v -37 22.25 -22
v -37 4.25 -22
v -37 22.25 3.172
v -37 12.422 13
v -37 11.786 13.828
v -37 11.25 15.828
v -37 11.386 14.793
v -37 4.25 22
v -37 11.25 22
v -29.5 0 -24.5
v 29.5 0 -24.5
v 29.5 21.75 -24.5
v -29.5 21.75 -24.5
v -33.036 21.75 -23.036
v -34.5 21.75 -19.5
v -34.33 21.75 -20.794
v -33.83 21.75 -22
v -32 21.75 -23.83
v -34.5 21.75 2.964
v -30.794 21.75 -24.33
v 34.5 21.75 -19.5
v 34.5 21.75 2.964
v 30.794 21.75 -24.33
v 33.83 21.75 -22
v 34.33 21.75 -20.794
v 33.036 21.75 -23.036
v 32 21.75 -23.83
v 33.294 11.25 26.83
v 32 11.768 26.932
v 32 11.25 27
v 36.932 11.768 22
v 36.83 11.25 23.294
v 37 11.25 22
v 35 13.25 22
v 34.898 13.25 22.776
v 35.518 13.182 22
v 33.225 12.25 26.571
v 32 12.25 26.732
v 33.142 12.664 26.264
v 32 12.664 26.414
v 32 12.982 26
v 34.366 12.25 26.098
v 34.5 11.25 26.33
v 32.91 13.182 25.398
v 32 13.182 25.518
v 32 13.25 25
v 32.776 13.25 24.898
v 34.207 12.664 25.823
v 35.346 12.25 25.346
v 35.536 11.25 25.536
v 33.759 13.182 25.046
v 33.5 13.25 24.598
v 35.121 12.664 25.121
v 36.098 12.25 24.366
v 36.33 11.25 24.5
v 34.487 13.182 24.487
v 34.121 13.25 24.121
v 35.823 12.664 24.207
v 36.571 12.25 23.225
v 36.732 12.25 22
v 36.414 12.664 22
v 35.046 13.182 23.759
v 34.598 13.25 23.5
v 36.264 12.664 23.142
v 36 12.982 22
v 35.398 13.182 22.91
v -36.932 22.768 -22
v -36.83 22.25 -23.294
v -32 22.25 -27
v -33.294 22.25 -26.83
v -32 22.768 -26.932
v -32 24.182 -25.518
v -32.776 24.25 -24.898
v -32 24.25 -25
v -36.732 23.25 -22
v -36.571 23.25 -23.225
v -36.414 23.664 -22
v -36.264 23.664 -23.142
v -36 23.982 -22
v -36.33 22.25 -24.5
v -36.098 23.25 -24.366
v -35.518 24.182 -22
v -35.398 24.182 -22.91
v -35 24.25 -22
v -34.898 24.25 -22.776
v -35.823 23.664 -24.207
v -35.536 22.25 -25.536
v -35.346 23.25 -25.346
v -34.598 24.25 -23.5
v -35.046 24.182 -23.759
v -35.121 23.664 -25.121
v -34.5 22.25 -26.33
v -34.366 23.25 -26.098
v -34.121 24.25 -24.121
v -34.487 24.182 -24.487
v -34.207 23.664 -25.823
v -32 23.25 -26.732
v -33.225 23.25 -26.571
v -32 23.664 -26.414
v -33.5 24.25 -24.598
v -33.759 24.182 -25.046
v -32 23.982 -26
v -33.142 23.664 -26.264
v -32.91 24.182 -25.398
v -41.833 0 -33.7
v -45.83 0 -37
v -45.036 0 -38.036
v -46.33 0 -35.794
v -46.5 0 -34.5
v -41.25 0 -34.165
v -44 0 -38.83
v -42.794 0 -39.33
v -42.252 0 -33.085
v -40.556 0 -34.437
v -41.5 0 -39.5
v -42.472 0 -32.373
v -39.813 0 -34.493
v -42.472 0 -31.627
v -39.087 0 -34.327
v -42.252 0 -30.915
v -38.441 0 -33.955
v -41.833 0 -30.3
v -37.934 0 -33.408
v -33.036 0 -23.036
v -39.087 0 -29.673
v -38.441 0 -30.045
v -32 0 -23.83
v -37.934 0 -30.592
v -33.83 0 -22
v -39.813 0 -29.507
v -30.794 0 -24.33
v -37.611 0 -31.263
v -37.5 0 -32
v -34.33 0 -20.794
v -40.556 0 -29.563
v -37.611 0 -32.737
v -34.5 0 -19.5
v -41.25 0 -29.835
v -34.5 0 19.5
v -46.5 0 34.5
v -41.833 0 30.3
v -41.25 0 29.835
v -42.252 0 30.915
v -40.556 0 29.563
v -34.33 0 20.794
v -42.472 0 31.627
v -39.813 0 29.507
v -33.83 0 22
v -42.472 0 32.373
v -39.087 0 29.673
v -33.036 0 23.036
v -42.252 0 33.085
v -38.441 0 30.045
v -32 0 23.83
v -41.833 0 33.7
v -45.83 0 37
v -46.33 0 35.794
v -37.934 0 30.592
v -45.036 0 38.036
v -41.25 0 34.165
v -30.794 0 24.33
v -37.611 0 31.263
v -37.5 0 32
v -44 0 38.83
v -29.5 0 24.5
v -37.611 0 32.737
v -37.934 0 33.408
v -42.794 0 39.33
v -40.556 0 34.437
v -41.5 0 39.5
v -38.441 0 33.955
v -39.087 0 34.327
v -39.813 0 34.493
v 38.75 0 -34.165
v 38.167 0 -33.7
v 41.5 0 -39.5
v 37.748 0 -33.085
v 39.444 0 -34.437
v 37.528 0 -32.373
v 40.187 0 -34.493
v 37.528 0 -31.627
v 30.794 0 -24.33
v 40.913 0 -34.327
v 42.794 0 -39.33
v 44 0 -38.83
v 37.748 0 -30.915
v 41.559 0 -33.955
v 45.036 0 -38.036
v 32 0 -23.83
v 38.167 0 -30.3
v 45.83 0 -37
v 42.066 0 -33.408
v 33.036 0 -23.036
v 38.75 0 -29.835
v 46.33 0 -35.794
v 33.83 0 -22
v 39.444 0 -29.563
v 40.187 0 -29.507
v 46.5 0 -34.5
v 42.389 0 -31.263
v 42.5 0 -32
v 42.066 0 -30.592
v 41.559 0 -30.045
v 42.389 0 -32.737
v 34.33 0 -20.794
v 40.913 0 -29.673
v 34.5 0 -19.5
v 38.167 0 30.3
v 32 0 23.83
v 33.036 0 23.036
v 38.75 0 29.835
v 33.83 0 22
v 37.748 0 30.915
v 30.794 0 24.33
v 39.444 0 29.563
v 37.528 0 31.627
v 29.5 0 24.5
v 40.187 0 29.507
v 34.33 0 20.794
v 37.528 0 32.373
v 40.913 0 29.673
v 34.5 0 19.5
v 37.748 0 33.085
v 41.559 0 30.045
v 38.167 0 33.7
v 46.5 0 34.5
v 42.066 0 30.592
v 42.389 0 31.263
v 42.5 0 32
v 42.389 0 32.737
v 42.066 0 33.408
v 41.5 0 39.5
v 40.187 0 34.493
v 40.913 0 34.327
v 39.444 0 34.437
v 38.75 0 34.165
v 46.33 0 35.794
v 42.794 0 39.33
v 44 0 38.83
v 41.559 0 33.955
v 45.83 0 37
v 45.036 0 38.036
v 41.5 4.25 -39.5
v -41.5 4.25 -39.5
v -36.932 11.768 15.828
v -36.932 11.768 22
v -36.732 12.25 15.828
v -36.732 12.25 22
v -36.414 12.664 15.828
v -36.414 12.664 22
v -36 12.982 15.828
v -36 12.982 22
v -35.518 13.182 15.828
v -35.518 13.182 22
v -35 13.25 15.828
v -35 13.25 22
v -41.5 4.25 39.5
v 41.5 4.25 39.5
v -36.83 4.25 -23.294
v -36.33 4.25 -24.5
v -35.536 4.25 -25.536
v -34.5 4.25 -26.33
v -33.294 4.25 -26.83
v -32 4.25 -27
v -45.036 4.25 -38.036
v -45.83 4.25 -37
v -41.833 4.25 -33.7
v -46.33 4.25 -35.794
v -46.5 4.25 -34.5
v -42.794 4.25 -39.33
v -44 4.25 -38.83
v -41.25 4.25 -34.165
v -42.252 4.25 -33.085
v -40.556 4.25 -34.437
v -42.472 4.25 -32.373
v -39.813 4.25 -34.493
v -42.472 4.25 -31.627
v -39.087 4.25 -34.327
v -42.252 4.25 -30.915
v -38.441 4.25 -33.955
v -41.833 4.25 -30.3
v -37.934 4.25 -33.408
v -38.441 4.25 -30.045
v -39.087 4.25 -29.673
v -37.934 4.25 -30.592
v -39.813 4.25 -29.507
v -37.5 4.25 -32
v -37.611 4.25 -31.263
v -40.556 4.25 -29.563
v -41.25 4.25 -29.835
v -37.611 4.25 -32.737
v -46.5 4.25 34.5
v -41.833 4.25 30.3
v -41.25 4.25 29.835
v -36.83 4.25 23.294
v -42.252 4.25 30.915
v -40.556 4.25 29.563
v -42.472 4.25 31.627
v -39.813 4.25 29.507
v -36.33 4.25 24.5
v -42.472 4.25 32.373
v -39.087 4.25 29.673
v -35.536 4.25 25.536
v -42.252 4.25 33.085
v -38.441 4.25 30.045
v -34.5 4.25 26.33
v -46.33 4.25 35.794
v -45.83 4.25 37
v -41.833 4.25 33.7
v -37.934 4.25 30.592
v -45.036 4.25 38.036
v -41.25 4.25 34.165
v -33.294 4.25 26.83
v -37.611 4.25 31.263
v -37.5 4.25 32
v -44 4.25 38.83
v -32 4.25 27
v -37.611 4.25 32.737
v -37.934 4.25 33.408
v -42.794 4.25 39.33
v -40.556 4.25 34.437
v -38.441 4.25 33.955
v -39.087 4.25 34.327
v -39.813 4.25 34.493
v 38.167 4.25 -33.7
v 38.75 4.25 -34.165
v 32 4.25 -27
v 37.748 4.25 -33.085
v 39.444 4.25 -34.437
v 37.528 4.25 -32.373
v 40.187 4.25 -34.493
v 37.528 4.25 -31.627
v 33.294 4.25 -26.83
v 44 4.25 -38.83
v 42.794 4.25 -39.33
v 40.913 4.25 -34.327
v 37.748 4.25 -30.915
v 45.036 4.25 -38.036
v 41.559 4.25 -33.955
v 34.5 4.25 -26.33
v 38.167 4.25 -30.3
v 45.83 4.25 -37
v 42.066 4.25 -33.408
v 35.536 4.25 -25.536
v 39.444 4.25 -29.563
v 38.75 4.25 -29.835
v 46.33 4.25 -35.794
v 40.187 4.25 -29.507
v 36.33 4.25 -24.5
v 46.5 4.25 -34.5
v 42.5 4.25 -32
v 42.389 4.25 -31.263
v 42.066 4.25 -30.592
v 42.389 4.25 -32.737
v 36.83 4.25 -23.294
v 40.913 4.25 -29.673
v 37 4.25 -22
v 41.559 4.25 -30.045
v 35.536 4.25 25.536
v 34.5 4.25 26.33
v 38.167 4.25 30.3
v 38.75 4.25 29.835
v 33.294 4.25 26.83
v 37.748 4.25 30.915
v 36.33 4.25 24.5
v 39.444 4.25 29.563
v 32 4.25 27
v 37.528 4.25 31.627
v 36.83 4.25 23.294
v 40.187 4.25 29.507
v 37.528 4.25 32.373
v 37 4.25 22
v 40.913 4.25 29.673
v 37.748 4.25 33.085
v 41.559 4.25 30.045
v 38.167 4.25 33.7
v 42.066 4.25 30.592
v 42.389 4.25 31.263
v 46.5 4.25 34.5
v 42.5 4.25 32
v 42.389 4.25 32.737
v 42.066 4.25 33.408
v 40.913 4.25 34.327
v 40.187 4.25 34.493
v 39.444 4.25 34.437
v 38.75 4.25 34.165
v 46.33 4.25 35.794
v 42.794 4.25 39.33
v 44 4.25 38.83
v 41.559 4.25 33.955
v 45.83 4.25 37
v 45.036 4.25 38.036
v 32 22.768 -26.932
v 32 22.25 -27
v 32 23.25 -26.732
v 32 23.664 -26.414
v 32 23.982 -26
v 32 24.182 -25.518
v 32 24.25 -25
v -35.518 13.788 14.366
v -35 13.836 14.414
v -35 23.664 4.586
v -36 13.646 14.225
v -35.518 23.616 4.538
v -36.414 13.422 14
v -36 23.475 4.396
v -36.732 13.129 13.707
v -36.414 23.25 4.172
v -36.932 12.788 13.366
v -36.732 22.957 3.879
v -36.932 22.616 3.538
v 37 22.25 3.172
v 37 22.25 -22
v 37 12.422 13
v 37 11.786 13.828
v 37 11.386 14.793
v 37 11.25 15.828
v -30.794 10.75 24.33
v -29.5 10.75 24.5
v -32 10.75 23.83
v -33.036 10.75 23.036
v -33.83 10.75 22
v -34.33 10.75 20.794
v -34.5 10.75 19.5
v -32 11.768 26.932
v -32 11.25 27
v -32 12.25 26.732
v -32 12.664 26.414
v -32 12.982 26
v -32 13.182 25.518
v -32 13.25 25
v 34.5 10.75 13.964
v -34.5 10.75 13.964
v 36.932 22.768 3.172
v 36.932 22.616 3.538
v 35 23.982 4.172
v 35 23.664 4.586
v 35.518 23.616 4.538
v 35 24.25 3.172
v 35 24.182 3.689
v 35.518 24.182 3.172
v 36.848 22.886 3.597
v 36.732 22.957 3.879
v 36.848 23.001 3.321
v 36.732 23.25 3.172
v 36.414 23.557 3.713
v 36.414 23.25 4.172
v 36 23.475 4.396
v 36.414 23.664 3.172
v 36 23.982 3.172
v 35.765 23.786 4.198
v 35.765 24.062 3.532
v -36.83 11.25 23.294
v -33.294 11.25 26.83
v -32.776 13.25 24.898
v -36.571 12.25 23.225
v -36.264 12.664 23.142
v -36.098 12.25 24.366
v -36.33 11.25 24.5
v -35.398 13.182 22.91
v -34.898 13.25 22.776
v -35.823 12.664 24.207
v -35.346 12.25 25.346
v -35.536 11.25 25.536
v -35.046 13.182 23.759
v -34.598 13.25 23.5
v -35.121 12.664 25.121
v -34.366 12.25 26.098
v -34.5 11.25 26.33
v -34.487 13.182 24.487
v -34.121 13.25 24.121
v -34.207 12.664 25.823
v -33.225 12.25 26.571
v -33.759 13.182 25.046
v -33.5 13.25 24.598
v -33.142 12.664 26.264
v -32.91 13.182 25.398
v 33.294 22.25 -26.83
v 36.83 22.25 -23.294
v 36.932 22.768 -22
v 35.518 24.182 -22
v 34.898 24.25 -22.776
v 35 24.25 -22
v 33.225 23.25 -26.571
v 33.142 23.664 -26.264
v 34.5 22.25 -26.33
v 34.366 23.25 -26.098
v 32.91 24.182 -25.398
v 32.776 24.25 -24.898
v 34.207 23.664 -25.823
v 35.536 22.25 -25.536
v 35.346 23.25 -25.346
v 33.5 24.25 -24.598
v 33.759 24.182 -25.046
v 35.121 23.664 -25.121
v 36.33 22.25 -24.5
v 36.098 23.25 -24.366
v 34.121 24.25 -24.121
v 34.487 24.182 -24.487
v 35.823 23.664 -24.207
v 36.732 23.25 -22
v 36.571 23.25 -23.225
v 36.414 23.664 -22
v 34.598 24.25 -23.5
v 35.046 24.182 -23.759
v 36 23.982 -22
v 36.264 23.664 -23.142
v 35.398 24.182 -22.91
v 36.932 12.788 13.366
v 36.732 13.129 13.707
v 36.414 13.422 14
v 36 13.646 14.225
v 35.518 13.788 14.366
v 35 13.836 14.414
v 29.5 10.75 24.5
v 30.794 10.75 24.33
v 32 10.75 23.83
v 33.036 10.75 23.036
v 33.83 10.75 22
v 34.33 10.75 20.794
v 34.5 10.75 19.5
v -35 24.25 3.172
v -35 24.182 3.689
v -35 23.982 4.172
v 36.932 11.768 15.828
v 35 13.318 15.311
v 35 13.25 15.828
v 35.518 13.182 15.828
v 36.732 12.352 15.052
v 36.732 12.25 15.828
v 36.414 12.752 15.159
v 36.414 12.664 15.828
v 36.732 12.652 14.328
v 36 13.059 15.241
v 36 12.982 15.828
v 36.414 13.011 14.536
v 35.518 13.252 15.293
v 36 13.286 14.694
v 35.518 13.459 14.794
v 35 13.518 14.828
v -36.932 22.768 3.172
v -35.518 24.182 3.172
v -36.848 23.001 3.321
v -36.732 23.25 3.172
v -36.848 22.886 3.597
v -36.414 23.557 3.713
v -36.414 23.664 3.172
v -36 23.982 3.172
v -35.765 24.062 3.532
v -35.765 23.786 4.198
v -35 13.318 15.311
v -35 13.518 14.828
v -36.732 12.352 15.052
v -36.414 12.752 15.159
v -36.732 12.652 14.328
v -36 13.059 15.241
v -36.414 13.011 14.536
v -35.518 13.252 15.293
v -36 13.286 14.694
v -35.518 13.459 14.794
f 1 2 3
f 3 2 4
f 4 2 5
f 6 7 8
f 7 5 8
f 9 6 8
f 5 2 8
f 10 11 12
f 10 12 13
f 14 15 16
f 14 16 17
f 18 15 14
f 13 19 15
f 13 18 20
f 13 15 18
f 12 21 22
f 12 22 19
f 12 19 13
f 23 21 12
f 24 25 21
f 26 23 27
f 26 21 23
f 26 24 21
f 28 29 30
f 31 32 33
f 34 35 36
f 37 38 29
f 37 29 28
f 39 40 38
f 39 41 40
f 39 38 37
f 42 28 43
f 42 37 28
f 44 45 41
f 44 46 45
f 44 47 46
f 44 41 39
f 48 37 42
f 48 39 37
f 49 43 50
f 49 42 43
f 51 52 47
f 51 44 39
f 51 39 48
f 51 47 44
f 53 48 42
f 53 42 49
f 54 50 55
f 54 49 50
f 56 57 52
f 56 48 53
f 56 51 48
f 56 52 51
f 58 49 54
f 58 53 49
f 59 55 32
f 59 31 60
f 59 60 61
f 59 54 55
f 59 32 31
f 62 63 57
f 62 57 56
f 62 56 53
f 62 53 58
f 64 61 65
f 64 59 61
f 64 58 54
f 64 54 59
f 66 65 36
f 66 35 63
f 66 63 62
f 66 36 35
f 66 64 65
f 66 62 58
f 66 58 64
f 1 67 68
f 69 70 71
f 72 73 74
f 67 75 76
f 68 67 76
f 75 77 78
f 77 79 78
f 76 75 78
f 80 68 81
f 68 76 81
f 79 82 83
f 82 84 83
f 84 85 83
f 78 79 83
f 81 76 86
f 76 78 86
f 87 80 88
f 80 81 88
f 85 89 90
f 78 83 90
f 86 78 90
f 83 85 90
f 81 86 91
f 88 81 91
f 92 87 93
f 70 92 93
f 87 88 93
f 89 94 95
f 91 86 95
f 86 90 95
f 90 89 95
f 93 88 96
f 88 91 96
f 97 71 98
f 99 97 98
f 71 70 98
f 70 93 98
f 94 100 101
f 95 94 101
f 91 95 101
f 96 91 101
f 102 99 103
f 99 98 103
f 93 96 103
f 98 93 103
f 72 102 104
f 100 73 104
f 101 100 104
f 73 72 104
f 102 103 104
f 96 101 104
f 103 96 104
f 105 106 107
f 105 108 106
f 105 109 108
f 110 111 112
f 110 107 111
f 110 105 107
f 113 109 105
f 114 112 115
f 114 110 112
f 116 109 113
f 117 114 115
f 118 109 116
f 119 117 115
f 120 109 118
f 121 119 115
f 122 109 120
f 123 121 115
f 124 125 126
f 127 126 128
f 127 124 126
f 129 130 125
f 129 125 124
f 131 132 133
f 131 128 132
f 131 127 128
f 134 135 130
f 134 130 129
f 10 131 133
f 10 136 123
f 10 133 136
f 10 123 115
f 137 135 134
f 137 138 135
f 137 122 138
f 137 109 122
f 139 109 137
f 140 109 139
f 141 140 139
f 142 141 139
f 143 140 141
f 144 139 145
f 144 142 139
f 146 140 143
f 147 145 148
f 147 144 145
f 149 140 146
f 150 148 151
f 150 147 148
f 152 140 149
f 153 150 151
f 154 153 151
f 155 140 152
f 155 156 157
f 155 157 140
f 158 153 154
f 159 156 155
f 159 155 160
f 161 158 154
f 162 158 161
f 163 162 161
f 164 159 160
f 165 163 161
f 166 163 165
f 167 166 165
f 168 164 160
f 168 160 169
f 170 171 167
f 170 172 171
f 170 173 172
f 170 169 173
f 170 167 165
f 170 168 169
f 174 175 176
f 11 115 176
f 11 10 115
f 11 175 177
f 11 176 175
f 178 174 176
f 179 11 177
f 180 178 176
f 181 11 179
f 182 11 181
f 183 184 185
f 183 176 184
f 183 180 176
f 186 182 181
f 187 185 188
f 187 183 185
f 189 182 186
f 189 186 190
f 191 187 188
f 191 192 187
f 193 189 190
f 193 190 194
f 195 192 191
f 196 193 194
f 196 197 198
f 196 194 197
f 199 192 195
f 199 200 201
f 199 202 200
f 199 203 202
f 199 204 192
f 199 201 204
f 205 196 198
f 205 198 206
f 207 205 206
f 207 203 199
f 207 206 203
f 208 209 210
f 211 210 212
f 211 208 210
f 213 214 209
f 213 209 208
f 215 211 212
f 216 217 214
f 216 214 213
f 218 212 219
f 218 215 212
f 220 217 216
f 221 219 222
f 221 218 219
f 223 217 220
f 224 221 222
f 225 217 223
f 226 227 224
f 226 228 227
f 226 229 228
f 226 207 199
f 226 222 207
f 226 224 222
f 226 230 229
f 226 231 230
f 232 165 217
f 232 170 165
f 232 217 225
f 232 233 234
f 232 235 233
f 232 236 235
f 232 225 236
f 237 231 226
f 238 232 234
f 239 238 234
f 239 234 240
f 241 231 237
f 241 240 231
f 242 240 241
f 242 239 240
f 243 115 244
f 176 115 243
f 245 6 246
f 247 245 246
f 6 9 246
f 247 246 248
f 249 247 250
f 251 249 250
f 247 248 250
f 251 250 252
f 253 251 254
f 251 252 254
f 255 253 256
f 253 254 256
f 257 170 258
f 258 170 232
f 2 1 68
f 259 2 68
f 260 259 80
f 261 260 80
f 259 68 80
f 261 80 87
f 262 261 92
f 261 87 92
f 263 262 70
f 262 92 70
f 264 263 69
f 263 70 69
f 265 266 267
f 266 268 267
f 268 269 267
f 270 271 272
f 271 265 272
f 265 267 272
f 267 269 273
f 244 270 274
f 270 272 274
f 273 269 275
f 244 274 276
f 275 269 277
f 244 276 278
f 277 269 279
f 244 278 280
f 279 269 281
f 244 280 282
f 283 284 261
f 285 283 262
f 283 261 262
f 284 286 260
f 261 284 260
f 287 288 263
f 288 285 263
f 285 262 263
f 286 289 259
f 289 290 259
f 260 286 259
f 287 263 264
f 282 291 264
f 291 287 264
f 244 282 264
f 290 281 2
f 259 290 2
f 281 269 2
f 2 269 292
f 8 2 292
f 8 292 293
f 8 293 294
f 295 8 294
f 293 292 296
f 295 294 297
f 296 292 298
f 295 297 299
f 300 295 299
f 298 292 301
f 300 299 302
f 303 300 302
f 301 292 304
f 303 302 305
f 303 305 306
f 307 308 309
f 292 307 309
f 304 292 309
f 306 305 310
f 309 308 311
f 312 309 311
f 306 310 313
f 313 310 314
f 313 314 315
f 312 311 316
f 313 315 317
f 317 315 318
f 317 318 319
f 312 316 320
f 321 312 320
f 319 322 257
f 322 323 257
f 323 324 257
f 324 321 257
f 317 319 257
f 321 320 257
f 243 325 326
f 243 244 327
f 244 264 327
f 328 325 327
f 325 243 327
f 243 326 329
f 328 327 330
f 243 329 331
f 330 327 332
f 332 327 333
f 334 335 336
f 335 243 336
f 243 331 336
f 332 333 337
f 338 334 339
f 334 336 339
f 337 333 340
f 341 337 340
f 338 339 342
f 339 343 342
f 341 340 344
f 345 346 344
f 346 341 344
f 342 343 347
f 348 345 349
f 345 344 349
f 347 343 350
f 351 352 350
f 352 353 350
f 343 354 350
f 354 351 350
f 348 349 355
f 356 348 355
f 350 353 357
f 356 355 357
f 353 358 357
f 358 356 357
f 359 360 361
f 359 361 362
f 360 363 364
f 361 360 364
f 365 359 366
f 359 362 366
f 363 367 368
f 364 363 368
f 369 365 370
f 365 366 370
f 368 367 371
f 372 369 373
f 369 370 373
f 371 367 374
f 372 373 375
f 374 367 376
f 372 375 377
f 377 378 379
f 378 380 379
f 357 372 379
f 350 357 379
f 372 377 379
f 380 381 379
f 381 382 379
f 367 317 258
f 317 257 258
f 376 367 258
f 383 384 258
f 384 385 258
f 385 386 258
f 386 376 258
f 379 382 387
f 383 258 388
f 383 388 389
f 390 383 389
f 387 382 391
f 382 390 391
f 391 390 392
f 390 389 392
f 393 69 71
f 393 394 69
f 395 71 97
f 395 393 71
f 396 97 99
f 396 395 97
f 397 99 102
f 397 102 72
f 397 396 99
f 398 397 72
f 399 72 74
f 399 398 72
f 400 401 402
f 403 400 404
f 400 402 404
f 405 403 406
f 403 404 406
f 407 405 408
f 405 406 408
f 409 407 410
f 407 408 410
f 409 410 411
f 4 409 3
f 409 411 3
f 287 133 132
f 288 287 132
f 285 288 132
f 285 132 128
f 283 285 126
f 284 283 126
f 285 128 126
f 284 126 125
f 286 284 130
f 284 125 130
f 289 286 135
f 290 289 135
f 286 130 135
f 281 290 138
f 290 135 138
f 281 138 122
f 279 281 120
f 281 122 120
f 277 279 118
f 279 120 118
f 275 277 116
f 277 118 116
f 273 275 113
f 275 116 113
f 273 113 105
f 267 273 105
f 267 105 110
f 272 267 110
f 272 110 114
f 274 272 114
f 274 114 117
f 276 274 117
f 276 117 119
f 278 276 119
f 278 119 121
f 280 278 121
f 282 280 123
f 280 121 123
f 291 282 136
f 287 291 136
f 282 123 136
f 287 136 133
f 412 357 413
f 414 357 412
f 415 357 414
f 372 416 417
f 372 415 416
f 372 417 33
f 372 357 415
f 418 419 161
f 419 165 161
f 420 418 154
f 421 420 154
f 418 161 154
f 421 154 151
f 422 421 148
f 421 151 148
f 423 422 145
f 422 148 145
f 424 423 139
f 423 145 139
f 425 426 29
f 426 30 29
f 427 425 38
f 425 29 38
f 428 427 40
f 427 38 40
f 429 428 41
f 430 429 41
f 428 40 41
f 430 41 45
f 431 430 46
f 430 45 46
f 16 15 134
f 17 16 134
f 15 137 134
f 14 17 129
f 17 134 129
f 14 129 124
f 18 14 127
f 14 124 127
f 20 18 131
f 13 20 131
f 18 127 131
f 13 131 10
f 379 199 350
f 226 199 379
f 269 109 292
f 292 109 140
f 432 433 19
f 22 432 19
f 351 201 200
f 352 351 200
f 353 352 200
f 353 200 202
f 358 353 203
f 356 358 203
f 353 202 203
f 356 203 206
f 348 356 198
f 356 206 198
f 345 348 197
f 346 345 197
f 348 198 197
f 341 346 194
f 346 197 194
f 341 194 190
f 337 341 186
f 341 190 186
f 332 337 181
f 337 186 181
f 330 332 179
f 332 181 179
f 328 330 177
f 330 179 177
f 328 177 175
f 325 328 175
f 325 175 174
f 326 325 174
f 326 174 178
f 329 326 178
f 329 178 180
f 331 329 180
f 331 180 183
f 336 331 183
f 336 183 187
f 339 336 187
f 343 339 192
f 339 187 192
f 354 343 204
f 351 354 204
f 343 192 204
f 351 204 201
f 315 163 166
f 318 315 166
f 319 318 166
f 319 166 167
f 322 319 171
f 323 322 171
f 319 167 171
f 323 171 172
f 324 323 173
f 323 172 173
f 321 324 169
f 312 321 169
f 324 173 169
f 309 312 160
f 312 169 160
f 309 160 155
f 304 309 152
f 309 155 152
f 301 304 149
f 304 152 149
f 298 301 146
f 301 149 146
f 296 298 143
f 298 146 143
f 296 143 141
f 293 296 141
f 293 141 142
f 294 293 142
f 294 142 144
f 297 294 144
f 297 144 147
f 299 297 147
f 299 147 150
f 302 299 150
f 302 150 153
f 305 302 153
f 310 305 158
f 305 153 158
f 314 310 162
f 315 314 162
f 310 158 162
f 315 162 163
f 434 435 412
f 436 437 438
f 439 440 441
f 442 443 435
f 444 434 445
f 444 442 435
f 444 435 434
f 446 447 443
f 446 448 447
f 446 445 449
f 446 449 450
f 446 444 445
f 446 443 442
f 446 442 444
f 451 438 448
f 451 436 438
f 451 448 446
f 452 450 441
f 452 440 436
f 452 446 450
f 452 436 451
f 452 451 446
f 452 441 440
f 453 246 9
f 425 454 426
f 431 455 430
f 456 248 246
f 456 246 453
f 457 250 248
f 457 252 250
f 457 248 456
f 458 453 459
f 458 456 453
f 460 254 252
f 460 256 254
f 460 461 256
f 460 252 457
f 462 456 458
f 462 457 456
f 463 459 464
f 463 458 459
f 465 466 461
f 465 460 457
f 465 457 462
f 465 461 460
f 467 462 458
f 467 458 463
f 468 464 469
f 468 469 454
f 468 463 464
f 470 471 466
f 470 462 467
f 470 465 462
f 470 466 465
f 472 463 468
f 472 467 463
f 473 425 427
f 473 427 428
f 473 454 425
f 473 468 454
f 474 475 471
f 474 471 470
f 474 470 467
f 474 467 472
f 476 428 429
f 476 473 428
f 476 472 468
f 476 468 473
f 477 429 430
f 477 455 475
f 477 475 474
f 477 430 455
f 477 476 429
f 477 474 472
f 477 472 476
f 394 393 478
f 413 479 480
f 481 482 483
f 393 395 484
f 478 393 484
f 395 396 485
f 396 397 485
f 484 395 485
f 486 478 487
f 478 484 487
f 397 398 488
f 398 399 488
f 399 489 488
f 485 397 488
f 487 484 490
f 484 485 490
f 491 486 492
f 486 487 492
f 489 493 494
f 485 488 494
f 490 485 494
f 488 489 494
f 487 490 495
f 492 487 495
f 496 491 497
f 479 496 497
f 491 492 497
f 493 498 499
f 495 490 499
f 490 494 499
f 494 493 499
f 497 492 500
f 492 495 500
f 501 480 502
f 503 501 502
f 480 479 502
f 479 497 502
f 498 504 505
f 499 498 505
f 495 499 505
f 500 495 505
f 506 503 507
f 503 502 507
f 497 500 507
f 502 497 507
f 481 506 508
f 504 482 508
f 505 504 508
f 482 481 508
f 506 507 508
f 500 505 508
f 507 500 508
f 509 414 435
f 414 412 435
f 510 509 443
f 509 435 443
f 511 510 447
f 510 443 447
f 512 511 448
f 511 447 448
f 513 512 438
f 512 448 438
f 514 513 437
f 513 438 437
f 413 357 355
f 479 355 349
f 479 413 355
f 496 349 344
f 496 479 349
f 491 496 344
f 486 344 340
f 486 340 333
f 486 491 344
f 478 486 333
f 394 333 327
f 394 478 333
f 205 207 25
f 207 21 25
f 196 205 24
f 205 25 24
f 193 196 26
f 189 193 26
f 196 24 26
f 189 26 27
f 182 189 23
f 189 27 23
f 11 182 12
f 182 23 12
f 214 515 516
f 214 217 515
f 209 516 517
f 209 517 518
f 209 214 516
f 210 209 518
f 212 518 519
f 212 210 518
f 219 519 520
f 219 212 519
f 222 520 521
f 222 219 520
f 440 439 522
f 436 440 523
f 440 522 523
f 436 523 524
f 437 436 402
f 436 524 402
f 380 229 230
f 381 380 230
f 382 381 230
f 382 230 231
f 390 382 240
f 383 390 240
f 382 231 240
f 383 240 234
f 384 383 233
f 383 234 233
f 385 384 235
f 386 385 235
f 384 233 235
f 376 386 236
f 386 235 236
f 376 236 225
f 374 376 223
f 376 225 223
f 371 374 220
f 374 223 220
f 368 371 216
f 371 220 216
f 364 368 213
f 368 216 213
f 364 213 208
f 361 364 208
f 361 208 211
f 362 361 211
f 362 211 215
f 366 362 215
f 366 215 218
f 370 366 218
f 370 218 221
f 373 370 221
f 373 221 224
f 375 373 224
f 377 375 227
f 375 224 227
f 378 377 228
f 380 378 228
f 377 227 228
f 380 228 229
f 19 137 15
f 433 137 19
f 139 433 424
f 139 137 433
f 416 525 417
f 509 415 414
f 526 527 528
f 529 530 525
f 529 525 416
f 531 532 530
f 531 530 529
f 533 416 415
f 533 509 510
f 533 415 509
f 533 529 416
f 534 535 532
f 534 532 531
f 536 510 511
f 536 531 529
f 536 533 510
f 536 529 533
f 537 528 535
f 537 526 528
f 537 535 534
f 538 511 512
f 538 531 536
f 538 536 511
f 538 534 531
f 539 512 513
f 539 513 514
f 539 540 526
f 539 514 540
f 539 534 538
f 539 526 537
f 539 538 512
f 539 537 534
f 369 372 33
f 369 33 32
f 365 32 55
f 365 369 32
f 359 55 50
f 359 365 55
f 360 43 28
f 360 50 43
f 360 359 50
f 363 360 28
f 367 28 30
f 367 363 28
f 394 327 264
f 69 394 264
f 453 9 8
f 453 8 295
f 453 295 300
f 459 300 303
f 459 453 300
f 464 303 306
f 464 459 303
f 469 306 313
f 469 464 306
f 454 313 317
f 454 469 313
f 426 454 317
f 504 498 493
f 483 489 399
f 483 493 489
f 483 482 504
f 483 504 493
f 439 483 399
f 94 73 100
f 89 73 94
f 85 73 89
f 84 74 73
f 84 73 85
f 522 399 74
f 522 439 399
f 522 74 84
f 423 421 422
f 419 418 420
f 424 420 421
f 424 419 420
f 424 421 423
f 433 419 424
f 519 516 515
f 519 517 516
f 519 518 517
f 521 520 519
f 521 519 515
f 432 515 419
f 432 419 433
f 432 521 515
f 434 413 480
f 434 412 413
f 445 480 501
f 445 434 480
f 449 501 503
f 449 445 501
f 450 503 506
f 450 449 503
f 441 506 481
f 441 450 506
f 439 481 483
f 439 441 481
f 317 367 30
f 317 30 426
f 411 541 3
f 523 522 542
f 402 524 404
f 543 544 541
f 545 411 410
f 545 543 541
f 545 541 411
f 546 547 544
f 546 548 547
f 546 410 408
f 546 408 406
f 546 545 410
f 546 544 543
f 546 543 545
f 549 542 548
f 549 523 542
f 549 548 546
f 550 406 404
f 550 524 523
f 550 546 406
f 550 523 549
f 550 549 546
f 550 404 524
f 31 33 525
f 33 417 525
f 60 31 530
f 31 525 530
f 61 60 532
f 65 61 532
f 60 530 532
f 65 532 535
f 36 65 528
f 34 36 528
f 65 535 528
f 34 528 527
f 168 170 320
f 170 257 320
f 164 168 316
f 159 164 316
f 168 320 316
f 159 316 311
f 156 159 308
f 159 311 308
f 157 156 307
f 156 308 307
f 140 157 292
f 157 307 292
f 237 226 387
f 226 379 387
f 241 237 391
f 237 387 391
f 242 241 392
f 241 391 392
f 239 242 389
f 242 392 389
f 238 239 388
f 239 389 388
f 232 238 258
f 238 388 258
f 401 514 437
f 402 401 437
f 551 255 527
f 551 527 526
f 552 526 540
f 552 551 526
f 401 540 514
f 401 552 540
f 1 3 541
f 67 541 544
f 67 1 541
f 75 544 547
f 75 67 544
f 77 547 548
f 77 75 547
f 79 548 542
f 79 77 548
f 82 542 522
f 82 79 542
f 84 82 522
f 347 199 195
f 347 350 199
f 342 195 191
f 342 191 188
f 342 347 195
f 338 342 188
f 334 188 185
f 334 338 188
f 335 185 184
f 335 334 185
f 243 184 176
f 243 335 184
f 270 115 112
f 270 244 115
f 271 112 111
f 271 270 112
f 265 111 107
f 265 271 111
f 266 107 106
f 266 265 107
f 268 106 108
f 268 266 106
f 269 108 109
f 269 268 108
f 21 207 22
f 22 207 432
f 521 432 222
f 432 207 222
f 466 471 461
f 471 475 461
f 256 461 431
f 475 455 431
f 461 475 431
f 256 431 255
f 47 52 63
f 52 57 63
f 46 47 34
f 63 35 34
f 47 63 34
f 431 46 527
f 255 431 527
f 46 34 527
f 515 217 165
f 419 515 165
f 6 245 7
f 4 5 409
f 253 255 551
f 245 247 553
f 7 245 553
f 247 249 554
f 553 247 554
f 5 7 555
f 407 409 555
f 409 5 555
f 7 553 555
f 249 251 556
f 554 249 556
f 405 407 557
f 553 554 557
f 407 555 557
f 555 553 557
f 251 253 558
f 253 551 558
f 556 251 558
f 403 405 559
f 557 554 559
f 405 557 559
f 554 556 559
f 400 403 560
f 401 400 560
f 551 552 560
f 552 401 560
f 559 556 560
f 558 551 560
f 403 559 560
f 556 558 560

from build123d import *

# Parameters (mm, degrees)
F0_W     = 93
F0_H     = 79
F0_R     = 2.5
F0_W_2   = 69
F0_H_2   = 49
F1_DEPTH = 4.25
F2_W     = 74
F2_H     = 54
F2_W_2   = 69
F2_H_2   = 49
F3_DEPTH = 20
F6_DEPTH = 83.501
F8_DEPTH = 71.5
F9_R     = 5
F10_R    = 2


with BuildPart() as f1:
    # F0 (on Front) → F1 (new body)
    with BuildSketch(Plane.XZ):
        Rectangle(F0_W, F0_H)
        with Locations((-40, -32)):
            Circle(F0_R, mode=Mode.SUBTRACT)
        with Locations((40, -32)):
            Circle(F0_R, mode=Mode.SUBTRACT)
        with Locations((-40, 32)):
            Circle(F0_R, mode=Mode.SUBTRACT)
        Rectangle(F0_W_2, F0_H_2, mode=Mode.SUBTRACT)
        with Locations((40, 32)):
            Circle(F0_R, mode=Mode.SUBTRACT)
    extrude(amount=-F1_DEPTH)

    # F2 (on face) → F3 (join)
    with BuildSketch(Plane(origin=(0, 4.25, 0), x_dir=(-1, 0, 0), z_dir=(0, 1, 0))):
        Rectangle(F2_W, F2_H)
        Rectangle(F2_W_2, F2_H_2, mode=Mode.SUBTRACT)
    extrude(amount=F3_DEPTH)

    # F5 (on face) → F6 (cut, through all)
    with BuildSketch(Plane.YZ.offset(37)):
        Polygon((24.25, 29.4060515452), (13.25, 29.4060515452), (13.25, 15), (24.25, 4), align=None)
    extrude(amount=-F6_DEPTH, mode=Mode.SUBTRACT)

    # F7 (on face) → F8 (join, through all)
    with BuildSketch(Plane.YZ.offset(37)):
        Polygon((13.25, 27), (10.75, 27), (10.75, 13.9644660941), (21.75, 2.9644660941), (21.75, -27), (24.25, -27), (24.25, 4), (13.25, 15), align=None)
    extrude(amount=-F8_DEPTH)

    # F9
    f9_edges = [f1.edges().sort_by_distance(p)[0] for p in [
        (37, 14.25, -27),
        (37, 8.75, 27),
        (-37, 8.75, 27),
        (-37, 14.25, -27),
        (-46.5, 2.125, 39.5),
        (-46.5, 2.125, -39.5),
        (46.5, 2.125, 39.5),
        (46.5, 2.125, -39.5),
        (-34.5, 5.375, 24.5),
        (34.5, 5.375, 24.5),
        (34.5, 10.875, -24.5),
        (-34.5, 10.875, -24.5),
    ]]
    fillet(f9_edges, radius=F9_R)

    # F10
    f10_edges = [f1.edges().sort_by_distance(p)[0] for p in [
        (37, 13.25, 18.5),
        (37, 18.75, 9.5),
        (37, 24.25, -9),
        (-37, 18.75, 9.5),
        (0, 13.25, 27),
        (0, 24.25, -27),
        (-37, 24.25, -9),
        (-37, 13.25, 18.5),
        (0, 24.25, 4),
        (0, 13.25, 15),
    ]]
    fillet(f10_edges, radius=F10_R)


solid = f1.part
